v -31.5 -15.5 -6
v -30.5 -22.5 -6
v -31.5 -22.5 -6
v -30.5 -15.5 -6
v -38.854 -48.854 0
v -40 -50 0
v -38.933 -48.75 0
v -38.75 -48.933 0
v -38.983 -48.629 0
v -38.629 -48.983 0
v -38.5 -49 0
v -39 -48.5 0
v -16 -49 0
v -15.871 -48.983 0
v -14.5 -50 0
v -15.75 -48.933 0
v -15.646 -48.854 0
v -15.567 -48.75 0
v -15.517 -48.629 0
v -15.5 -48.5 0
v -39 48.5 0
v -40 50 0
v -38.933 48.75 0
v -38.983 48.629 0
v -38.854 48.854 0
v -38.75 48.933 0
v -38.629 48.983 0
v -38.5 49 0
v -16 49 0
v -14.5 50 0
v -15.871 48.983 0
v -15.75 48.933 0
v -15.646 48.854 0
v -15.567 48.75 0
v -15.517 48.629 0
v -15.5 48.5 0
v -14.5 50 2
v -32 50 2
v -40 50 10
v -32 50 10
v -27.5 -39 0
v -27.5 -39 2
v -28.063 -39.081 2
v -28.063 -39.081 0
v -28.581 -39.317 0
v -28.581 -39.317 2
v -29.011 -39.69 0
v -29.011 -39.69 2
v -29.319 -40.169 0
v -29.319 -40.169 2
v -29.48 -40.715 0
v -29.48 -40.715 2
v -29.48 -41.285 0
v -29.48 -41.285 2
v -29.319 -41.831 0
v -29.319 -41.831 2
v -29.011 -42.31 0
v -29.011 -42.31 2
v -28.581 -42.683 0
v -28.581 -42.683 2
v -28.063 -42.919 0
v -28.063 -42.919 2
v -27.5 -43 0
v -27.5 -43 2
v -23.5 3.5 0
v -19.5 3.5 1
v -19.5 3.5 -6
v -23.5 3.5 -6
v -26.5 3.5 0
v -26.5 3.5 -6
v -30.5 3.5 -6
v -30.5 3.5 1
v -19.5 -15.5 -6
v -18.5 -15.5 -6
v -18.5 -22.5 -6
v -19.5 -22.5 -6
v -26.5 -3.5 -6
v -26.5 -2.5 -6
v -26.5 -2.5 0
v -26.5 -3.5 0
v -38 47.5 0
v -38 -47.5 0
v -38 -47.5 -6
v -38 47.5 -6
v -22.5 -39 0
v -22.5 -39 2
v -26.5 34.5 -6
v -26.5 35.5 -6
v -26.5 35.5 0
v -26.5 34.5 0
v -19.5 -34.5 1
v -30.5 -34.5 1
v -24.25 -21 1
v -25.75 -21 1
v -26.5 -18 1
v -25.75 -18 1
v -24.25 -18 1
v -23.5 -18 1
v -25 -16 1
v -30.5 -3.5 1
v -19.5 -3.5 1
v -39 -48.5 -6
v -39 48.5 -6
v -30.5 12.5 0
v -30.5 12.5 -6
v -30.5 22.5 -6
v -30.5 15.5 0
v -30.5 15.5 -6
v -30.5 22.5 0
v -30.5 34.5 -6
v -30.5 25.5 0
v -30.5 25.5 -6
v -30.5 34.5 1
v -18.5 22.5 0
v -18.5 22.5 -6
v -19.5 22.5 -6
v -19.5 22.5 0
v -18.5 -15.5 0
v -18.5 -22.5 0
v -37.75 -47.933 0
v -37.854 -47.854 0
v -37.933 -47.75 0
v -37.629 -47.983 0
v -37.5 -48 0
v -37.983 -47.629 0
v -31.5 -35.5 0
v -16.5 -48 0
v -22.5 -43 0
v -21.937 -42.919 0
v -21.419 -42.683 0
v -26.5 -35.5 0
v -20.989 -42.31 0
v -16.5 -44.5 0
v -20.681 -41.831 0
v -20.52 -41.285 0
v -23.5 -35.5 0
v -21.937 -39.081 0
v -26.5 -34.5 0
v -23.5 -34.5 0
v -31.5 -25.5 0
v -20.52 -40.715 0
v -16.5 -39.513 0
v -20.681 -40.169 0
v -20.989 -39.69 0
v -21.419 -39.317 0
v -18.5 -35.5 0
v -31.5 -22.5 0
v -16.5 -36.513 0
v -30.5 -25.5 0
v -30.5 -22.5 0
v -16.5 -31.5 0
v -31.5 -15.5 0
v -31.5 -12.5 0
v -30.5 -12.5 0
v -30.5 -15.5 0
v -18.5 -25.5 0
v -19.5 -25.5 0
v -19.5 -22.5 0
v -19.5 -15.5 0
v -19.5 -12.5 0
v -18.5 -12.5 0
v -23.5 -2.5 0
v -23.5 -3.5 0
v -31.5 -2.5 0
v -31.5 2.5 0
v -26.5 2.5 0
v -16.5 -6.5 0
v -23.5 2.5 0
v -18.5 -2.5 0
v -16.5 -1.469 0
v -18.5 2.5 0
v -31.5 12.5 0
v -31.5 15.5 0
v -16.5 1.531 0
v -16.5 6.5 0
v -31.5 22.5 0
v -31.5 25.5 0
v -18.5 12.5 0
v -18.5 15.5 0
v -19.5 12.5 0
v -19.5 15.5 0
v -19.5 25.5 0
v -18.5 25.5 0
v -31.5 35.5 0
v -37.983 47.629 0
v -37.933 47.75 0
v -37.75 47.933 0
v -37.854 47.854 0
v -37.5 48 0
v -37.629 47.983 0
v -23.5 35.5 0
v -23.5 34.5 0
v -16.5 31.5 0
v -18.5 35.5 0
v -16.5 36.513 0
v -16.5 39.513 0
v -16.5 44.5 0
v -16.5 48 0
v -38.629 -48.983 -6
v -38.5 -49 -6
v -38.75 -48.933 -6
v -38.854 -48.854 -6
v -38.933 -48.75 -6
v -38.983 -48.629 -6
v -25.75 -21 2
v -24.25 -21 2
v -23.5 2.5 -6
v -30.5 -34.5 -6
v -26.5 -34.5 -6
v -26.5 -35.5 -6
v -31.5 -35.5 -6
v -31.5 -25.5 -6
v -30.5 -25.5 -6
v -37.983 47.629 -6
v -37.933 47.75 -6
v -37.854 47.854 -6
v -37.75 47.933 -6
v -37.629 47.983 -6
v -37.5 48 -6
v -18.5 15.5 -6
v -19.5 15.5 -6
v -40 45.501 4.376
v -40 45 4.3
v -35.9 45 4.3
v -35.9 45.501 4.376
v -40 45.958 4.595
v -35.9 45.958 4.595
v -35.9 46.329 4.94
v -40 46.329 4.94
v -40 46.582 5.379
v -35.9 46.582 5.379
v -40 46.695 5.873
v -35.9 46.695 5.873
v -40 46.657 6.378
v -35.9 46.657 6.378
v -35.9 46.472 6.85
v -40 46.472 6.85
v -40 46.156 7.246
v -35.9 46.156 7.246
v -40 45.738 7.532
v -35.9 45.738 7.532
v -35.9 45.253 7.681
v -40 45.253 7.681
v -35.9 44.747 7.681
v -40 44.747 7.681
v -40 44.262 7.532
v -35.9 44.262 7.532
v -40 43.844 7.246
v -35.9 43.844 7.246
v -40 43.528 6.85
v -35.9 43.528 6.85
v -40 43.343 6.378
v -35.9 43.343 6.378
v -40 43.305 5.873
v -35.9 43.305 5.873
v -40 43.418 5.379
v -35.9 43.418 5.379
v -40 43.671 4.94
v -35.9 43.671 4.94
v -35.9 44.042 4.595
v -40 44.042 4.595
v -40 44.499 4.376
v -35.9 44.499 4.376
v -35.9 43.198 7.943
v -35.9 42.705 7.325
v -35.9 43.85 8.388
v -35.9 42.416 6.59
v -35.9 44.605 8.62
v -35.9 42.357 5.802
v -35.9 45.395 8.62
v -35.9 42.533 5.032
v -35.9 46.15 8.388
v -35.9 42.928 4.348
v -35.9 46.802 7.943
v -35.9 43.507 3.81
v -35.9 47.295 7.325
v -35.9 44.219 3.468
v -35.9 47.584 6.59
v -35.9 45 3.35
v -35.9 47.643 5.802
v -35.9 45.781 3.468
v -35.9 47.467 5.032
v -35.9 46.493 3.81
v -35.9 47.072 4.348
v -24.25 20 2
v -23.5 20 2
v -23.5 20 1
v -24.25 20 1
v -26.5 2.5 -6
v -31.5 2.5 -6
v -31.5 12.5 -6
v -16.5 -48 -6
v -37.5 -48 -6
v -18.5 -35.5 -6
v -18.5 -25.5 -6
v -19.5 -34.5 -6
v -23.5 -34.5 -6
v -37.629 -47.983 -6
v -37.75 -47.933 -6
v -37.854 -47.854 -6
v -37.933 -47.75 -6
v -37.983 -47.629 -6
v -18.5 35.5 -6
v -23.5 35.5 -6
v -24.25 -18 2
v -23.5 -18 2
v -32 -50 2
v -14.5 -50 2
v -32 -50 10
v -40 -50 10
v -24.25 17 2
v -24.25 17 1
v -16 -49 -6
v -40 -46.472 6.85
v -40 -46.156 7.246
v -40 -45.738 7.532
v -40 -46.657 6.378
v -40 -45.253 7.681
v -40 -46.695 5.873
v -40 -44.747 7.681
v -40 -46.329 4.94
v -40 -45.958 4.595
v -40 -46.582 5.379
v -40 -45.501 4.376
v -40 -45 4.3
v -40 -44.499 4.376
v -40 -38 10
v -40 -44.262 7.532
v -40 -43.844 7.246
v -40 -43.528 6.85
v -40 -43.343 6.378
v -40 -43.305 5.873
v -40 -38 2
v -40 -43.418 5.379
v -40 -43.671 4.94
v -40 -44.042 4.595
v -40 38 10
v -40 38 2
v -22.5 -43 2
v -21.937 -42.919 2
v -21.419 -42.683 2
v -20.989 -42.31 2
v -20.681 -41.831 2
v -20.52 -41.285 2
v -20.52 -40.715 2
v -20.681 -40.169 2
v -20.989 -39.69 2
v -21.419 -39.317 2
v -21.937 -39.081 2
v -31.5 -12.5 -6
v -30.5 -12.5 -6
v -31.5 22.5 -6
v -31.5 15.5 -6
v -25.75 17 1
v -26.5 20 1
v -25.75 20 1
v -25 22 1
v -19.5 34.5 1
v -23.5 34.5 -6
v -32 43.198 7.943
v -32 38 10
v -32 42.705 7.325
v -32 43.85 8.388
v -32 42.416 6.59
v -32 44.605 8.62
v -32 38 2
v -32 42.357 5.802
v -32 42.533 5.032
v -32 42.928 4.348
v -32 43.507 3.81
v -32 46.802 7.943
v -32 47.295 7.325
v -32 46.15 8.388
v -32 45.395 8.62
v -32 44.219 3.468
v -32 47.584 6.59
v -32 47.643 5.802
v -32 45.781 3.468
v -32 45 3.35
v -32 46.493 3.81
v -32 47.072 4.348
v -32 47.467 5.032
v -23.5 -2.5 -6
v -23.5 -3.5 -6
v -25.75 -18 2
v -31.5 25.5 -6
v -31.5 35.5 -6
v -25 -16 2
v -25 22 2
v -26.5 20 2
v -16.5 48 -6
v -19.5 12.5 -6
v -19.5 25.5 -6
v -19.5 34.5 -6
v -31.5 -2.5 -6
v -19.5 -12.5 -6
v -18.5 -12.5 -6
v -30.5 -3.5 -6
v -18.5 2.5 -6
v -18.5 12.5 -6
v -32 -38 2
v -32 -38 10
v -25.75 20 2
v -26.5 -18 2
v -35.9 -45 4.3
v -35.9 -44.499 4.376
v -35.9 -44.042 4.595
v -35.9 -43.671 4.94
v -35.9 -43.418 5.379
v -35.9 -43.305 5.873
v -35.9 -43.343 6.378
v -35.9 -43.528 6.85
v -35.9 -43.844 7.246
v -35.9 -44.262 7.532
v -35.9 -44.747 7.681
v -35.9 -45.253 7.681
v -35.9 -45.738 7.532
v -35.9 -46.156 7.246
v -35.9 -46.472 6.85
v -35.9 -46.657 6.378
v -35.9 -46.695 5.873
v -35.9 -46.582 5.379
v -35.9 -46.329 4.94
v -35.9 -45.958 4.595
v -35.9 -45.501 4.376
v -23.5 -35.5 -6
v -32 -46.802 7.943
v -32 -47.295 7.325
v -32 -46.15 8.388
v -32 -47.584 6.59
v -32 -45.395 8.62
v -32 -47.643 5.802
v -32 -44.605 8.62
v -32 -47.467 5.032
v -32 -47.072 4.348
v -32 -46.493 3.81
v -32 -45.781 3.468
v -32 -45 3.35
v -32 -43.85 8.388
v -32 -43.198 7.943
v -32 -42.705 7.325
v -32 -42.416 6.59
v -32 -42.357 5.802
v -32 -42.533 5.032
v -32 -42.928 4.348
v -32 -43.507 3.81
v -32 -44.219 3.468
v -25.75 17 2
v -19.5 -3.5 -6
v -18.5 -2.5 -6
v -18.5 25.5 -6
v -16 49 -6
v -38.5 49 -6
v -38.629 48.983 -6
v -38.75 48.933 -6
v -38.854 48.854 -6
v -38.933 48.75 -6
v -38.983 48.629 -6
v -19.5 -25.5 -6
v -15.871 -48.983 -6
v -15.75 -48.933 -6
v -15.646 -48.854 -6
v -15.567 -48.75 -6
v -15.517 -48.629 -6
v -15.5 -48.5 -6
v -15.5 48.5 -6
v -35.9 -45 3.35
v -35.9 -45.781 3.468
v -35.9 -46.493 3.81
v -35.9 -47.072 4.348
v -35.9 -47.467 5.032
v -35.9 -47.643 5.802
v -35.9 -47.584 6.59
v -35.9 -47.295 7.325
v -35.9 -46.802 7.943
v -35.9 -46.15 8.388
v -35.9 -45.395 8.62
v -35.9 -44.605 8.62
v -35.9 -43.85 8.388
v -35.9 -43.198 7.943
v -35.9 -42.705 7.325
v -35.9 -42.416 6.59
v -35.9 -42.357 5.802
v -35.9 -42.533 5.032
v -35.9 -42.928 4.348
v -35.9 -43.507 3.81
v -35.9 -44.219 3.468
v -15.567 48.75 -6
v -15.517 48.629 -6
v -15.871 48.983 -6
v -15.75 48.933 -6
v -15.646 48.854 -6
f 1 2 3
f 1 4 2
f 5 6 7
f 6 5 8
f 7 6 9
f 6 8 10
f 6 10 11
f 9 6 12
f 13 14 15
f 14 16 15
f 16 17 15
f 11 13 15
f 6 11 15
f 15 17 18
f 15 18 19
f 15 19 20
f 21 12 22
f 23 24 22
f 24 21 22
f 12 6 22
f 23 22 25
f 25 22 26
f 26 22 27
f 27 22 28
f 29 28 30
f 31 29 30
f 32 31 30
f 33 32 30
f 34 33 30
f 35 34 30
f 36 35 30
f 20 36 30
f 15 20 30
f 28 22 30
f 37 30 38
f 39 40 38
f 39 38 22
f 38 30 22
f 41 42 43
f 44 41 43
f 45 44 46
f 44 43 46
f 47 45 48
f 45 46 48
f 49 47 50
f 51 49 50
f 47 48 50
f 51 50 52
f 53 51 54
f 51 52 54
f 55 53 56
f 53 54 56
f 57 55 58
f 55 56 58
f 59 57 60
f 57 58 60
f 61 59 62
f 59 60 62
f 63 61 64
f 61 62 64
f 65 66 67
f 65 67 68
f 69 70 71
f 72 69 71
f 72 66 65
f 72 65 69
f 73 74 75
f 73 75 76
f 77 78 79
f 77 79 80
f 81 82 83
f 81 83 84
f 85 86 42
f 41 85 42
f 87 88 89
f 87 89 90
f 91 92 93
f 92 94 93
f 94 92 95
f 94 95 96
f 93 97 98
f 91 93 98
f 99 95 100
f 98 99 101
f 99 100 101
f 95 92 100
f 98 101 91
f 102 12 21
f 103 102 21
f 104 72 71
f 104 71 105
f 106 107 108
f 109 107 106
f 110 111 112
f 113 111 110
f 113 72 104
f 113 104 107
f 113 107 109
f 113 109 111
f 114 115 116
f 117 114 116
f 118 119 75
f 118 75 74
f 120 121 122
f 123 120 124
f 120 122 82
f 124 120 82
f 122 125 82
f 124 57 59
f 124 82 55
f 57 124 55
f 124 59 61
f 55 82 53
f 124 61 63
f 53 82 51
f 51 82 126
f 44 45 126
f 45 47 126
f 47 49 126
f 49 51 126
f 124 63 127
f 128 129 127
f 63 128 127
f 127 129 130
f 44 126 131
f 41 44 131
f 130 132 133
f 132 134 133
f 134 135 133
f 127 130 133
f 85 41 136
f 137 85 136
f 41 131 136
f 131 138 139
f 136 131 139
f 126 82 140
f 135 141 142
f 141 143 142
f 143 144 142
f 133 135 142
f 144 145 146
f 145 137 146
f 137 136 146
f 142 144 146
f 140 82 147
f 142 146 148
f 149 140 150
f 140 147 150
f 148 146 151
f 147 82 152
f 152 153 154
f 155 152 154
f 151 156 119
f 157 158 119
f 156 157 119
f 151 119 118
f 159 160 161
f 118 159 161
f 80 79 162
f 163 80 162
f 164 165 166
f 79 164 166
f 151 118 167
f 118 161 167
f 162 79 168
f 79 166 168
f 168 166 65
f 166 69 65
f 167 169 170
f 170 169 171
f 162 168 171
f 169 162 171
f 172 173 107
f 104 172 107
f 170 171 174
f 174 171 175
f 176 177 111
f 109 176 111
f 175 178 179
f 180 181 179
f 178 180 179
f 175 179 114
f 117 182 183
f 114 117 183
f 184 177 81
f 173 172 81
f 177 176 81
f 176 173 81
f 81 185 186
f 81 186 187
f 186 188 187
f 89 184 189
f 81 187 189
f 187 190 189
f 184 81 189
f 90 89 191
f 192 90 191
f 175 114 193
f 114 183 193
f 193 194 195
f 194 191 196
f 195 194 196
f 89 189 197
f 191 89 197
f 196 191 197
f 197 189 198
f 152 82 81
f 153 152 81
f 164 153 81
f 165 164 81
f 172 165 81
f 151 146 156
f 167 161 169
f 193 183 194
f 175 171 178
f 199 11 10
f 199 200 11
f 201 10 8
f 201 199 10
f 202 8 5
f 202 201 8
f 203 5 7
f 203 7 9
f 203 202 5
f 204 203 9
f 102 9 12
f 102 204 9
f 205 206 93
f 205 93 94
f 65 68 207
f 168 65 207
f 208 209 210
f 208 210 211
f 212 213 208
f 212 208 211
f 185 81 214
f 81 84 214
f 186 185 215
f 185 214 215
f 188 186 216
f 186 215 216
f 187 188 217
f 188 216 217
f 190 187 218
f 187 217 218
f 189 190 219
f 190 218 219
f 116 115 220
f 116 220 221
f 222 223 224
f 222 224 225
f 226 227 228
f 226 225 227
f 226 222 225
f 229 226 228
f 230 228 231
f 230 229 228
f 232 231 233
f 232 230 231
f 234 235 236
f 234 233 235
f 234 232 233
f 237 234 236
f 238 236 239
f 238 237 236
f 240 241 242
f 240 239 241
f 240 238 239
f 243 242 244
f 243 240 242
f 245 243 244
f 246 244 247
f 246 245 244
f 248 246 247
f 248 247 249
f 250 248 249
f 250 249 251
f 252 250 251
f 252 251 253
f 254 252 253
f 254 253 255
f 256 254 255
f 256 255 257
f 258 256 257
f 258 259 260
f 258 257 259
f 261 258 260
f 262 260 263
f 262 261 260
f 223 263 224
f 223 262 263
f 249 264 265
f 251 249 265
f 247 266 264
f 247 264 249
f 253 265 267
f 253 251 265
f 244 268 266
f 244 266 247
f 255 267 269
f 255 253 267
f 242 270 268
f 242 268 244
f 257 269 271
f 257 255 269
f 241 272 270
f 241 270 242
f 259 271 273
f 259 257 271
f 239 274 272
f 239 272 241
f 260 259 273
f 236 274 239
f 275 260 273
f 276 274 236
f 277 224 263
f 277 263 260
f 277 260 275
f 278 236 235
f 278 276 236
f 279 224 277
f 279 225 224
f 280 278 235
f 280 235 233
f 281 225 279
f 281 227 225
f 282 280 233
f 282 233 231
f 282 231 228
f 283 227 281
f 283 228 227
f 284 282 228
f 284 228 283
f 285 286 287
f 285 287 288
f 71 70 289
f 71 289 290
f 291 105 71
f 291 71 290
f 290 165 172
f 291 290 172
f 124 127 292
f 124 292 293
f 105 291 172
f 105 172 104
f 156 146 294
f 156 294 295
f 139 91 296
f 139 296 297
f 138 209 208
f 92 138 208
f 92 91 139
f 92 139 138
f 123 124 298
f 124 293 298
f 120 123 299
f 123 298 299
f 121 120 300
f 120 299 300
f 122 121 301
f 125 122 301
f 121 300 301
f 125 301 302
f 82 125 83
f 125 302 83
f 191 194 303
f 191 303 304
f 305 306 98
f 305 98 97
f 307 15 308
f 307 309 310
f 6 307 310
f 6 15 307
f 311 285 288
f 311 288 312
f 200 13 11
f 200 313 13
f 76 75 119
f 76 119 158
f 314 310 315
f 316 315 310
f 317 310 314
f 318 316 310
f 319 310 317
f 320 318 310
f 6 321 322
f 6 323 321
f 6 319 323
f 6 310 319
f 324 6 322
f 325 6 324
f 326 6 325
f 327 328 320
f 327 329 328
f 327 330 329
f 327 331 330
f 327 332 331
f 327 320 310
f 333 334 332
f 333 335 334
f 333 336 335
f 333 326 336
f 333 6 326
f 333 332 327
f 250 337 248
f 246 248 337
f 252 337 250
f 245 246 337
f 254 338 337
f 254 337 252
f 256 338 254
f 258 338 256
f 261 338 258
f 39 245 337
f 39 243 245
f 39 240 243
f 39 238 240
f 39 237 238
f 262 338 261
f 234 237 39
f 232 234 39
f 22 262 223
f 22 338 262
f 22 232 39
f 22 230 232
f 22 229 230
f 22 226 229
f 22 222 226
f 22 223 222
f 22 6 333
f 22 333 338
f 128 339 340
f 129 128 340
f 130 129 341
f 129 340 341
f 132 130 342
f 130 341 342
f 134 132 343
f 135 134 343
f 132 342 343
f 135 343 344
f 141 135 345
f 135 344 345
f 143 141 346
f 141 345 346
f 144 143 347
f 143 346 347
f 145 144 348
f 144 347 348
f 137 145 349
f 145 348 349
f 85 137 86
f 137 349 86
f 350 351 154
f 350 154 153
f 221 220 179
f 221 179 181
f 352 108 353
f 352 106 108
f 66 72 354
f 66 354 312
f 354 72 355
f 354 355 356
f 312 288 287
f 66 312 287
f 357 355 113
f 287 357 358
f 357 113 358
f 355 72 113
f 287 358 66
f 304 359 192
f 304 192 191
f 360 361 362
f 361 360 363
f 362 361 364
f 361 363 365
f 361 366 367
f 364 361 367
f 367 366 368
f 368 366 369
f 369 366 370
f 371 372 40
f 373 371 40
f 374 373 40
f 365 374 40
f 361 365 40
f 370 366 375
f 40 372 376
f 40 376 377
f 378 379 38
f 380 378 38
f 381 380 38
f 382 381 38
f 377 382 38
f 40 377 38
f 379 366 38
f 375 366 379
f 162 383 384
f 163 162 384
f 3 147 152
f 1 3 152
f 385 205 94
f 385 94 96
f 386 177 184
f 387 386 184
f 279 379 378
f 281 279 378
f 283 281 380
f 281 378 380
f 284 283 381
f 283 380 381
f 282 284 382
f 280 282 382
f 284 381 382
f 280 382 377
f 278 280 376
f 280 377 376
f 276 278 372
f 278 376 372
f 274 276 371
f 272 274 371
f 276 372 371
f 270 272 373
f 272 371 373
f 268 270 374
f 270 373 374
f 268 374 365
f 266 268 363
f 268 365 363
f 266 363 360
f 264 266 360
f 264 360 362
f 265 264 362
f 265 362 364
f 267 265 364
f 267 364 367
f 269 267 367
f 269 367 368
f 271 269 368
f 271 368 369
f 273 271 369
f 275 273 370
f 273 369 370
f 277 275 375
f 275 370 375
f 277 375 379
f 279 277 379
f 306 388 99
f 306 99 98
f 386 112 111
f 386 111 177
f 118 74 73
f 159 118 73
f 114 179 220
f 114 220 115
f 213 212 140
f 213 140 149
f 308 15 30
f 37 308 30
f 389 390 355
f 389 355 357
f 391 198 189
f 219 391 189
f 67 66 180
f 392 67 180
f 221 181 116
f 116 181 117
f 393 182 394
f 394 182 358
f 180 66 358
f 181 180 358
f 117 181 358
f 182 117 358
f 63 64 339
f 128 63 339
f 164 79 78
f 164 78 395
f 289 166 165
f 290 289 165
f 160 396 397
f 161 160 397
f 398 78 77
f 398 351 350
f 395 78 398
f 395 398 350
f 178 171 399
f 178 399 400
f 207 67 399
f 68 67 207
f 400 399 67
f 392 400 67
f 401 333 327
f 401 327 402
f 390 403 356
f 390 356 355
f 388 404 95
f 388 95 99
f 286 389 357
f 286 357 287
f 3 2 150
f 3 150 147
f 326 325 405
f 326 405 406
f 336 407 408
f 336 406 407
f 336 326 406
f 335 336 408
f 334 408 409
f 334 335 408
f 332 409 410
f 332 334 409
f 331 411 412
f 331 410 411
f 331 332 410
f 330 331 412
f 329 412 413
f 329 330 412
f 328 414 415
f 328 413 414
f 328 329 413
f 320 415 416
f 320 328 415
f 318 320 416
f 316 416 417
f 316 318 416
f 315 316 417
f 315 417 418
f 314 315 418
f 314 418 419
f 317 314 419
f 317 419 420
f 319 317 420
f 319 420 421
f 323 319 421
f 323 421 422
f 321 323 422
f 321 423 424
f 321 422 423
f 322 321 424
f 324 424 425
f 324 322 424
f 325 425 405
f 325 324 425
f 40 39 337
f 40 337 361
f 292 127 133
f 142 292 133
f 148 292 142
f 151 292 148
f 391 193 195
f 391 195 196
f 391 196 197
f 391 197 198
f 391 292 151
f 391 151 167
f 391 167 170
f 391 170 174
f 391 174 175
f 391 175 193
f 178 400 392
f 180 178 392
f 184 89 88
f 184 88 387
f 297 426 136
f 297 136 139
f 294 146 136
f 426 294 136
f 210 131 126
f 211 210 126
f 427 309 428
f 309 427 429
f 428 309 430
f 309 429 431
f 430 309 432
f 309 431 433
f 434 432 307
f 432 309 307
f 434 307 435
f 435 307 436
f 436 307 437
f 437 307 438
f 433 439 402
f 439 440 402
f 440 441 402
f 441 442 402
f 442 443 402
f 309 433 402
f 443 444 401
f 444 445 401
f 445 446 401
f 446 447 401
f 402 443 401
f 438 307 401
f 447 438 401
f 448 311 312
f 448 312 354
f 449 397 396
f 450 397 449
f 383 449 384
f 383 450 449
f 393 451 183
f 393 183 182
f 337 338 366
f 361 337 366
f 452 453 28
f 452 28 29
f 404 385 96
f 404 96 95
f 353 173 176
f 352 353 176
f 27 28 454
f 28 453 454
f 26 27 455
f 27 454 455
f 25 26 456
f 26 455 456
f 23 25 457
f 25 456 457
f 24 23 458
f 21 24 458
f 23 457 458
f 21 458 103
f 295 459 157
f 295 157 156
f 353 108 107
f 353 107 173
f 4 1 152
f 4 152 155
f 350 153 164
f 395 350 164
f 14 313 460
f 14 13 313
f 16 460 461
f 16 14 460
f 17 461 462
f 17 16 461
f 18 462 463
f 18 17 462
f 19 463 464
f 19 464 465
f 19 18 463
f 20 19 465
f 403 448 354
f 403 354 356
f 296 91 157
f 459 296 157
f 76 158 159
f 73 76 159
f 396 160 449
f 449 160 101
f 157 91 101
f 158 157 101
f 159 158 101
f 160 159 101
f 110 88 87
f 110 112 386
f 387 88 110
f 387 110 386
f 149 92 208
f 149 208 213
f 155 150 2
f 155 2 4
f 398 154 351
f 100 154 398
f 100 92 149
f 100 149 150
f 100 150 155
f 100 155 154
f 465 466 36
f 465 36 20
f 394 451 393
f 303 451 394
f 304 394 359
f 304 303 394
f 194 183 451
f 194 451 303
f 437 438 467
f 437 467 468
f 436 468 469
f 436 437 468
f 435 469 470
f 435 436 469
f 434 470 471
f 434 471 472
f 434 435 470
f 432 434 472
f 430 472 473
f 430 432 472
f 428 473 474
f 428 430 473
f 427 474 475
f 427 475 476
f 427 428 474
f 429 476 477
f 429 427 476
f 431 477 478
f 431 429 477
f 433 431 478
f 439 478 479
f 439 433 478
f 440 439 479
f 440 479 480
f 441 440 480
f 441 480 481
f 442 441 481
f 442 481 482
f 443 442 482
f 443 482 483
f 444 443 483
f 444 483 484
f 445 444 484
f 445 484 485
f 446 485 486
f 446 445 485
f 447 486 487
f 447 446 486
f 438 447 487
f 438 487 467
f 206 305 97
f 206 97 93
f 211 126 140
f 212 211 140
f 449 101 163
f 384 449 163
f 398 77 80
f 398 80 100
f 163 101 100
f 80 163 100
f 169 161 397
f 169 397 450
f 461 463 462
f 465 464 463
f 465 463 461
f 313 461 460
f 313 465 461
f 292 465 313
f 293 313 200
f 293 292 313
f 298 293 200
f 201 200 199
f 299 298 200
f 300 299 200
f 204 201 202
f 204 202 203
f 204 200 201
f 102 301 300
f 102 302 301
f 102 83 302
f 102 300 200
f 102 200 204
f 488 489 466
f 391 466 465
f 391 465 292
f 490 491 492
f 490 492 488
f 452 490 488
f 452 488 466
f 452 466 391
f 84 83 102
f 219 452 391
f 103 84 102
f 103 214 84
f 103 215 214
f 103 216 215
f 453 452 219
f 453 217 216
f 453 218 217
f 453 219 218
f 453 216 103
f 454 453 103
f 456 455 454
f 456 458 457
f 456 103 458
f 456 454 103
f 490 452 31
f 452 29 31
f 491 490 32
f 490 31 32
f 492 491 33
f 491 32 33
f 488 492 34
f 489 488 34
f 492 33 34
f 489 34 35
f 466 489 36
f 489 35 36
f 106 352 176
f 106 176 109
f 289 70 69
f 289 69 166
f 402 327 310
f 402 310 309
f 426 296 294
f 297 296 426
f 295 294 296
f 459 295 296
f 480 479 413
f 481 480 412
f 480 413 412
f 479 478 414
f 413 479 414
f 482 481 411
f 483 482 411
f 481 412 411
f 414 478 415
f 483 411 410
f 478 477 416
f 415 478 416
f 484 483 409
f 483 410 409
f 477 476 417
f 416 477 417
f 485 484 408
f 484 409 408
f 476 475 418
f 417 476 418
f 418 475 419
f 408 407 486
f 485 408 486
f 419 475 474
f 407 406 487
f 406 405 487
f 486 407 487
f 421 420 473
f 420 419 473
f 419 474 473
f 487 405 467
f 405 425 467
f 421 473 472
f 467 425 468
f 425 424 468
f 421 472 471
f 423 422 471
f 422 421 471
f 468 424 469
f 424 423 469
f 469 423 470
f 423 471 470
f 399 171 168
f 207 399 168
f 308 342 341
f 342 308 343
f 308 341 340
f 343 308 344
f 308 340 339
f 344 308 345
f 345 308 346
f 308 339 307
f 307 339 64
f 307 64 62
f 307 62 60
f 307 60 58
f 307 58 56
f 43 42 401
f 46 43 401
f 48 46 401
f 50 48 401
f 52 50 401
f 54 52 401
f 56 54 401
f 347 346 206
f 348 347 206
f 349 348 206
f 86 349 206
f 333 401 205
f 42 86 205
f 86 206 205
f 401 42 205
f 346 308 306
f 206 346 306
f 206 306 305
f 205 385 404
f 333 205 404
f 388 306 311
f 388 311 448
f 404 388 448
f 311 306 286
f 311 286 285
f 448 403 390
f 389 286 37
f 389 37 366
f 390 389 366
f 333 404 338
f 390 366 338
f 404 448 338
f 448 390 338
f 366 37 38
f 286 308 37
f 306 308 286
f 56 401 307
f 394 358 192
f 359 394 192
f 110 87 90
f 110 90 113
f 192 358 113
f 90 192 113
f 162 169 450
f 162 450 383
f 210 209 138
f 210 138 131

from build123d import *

# Parameters (mm, degrees)
SKETCH1_W               = 80
SKETCH1_H               = 100
SKETCH1_W_2             = 31
SKETCH1_H_2             = 11
SKETCH1_W_3             = 11
SKETCH1_H_3             = 31
BOSS_EXTRUDE1_DEPTH     = 1
SKETCH2_W               = 80
SKETCH2_H               = 100
BACK_DEPTH              = 1
SKETCH3_W               = 13
SKETCH3_H               = 33
SKETCH3_W_2             = 11
SKETCH3_H_2             = 31
SKETCH3_W_3             = 33
SKETCH3_H_3             = 13
SKETCH3_W_4             = 31
SKETCH3_H_4             = 11
SEG_MASKS_DEPTH         = 6
SKETCH5_W               = 78
SKETCH5_H               = 98
SKETCH5_W_2             = 76
SKETCH5_H_2             = 96
OUTER_RIM_DEPTH         = 6
DIRECTION_DEPTH         = 65.412731661
DIRECTION_DEPTH_BACK    = 65.412731661
SKETCH7_W               = 17
SKETCH7_H               = 7
SKETCH7_W_2             = 7
SKETCH7_H_2             = 11.013011135
SKETCH7_H_3             = 10.96937703
SKETCH7_H_4             = 11.03062297
WIRE_CHASES_DEPTH       = 6
HANGING_HOLE_DEPTH      = 65.311740763
HANGING_HOLE_DEPTH_BACK = 65.311740763
FILLET1_R               = 0.5
SKETCH9_W               = 8
SKETCH9_H               = 12
BOSS_EXTRUDE2_DEPTH     = 8
CUT_EXTRUDE1_DEPTH      = 95.868329805
CUT_EXTRUDE1_DEPTH_BACK = 95.868329805
SKETCH10_R              = 1.7
SKETCH11_R              = 2.65
CUT_EXTRUDE2_DEPTH      = 3.9
MIRROR4_COPY_1_SKETCH_R = 2.65
MIRROR4_COPY_1_DEPTH    = 3.9
MIRROR4_COPY_2_SKETCH_R = 2.65
MIRROR4_COPY_2_DEPTH    = 3.9
SKETCH12_W              = 1.5
SKETCH12_H              = 7
BOSS_EXTRUDE3_DEPTH     = 6
SKETCH13_W              = 15.5
SKETCH13_H              = 1.5
BOSS_EXTRUDE4_DEPTH     = 1.5
FILLET2_R               = 1.5
CUT_EXTRUDE3_DEPTH      = 65.807406984
CUT_EXTRUDE3_DEPTH_BACK = 65.807406984
CUT_EXTRUDE4_DEPTH      = 65.807406984
CUT_EXTRUDE4_DEPTH_BACK = 65.807406984
SKETCH15_W              = 64.445806935
SKETCH15_H              = 114.080539226
SKETCH16_W              = 2
SKETCH16_H              = 100
BOSS_EXTRUDE5_DEPTH     = 8
CUT_EXTRUDE5_DEPTH      = 65.807406984
CUT_EXTRUDE5_DEPTH_BACK = 65.807406984
CUT_EXTRUDE6_DEPTH      = 6
FILLET3_R               = 0.5


with BuildPart() as part:
    # Sketch1 → Boss-Extrude1 (new body)
    with BuildSketch(Plane.XY):
        Rectangle(SKETCH1_W, SKETCH1_H)
        with Locations((0, 38)):
            Rectangle(SKETCH1_W_2, SKETCH1_H_2, mode=Mode.SUBTRACT)
        Rectangle(SKETCH1_W_2, SKETCH1_H_2, mode=Mode.SUBTRACT)
        with Locations((0, -38)):
            Rectangle(SKETCH1_W_2, SKETCH1_H_2, mode=Mode.SUBTRACT)
        with Locations((25, 19)):
            Rectangle(SKETCH1_W_3, SKETCH1_H_3, mode=Mode.SUBTRACT)
        with Locations((-25, 19)):
            Rectangle(SKETCH1_W_3, SKETCH1_H_3, mode=Mode.SUBTRACT)
        with Locations((-25, -19)):
            Rectangle(SKETCH1_W_3, SKETCH1_H_3, mode=Mode.SUBTRACT)
        with Locations((25, -19)):
            Rectangle(SKETCH1_W_3, SKETCH1_H_3, mode=Mode.SUBTRACT)
    extrude(amount=BOSS_EXTRUDE1_DEPTH)

    # Sketch2 → back (add)
    with BuildSketch(Plane.XY.offset(1)):
        Rectangle(SKETCH2_W, SKETCH2_H)
    extrude(amount=BACK_DEPTH)

    # Sketch3 → seg masks (add)
    # profile 1 of 7: a face of its own
    with BuildSketch(Plane(origin=(0, 0, 0), x_dir=(-1, 0, 0), z_dir=(0, 0, -1))):
        with Locations((-25, 19)):
            Rectangle(SKETCH3_W, SKETCH3_H)
        with Locations((-25, 19)):
            Rectangle(SKETCH3_W_2, SKETCH3_H_2, mode=Mode.SUBTRACT)
    # profile 2 of 7: a face of its own
    with BuildSketch(Plane(origin=(0, 0, 0), x_dir=(-1, 0, 0), z_dir=(0, 0, -1))):
        with Locations((0, 38)):
            Rectangle(SKETCH3_W_3, SKETCH3_H_3)
        with Locations((0, 38)):
            Rectangle(SKETCH3_W_4, SKETCH3_H_4, mode=Mode.SUBTRACT)
    # profile 3 of 7: a face of its own
    with BuildSketch(Plane(origin=(0, 0, 0), x_dir=(-1, 0, 0), z_dir=(0, 0, -1))):
        with Locations((25, 19)):
            Rectangle(SKETCH3_W, SKETCH3_H)
        with Locations((25, 19)):
            Rectangle(SKETCH3_W_2, SKETCH3_H_2, mode=Mode.SUBTRACT)
    # profile 4 of 7: a face of its own
    with BuildSketch(Plane(origin=(0, 0, 0), x_dir=(-1, 0, 0), z_dir=(0, 0, -1))):
        Rectangle(SKETCH3_W_3, SKETCH3_H_3)
        Rectangle(SKETCH3_W_4, SKETCH3_H_4, mode=Mode.SUBTRACT)
    # profile 5 of 7: a face of its own
    with BuildSketch(Plane(origin=(0, 0, 0), x_dir=(-1, 0, 0), z_dir=(0, 0, -1))):
        with Locations((-25, -19)):
            Rectangle(SKETCH3_W, SKETCH3_H)
        with Locations((-25, -19)):
            Rectangle(SKETCH3_W_2, SKETCH3_H_2, mode=Mode.SUBTRACT)
    # profile 6 of 7: a face of its own
    with BuildSketch(Plane(origin=(0, 0, 0), x_dir=(-1, 0, 0), z_dir=(0, 0, -1))):
        with Locations((0, -38)):
            Rectangle(SKETCH3_W_3, SKETCH3_H_3)
        with Locations((0, -38)):
            Rectangle(SKETCH3_W_4, SKETCH3_H_4, mode=Mode.SUBTRACT)
    # profile 7 of 7: a face of its own
    with BuildSketch(Plane(origin=(0, 0, 0), x_dir=(-1, 0, 0), z_dir=(0, 0, -1))):
        with Locations((25, -19)):
            Rectangle(SKETCH3_W, SKETCH3_H)
        with Locations((25, -19)):
            Rectangle(SKETCH3_W_2, SKETCH3_H_2, mode=Mode.SUBTRACT)
    extrude(amount=SEG_MASKS_DEPTH)

    # Sketch5 → outer rim (add)
    with BuildSketch(Plane(origin=(0, 0, 0), x_dir=(-1, 0, 0), z_dir=(0, 0, -1))):
        Rectangle(SKETCH5_W, SKETCH5_H)
        Rectangle(SKETCH5_W_2, SKETCH5_H_2, mode=Mode.SUBTRACT)
    extrude(amount=OUTER_RIM_DEPTH)

    # Sketch6 → direction (cut, two sides: drawn at the far end of the back side and taken through both)
    with BuildSketch(Plane(origin=(0, 0, 1), x_dir=(-1, 0, 0), z_dir=(0, 0, -1)).offset(-DIRECTION_DEPTH_BACK)):
        Polygon((25, 22), (23.5, 20), (24.25, 20), (24.25, 17), (25.75, 17), (25.75, 20), (26.5, 20), align=None)
        Polygon((-3, 38), (-1, 36.5), (-1, 37.25), (2, 37.25), (2, 38.75), (-1, 38.75), (-1, 39.5), align=None)
        Polygon((-24.25, 21), (-25.75, 21), (-25.75, 18.5), (-26.5, 18.5), (-25, 16), (-23.5, 18.5), (-24.25, 18.5), align=None)
        Polygon((-24.25, -17), (-25.75, -17), (-25.75, -20), (-26.5, -20), (-25, -22), (-23.5, -20), (-24.25, -20), align=None)
        Polygon((-2, -38.75), (-2, -37.25), (1, -37.25), (1, -36.5), (3, -38), (1, -39.5), (1, -38.75), align=None)
        Polygon((25, -16), (23.5, -18), (24.25, -18), (24.25, -21), (25.75, -21), (25.75, -18), (26.5, -18), align=None)
        Polygon((-0.5, 1.5), (-3, 0), (-0.5, -1.5), (-0.5, -0.75), (2, -0.75), (2, 0), (2, 0.75), (-0.5, 0.75), align=None)
    extrude(amount=DIRECTION_DEPTH + DIRECTION_DEPTH_BACK, mode=Mode.SUBTRACT)

    # Sketch7 → wire chases (cut)
    with BuildSketch(Plane(origin=(0, 0, -6), x_dir=(-1, 0, 0), z_dir=(0, 0, -1))):
        Polygon((-6.5, 46), (-3.5, 46), (-3.5, 39.513011135), (3.5, 39.513011135), (3.5, 46), (6.5, 46), (6.5, 39.513011135), (18, 39.513011135), (18, 36.513011135), (6.5, 36.513011135), (6.5, 25.5), (23.5, 25.5), (23.5, 37.5), (26.5, 37.5), (26.5, 25.5), (33, 25.5), (33, 22.5), (26.5, 22.5), (26.5, 15.5), (33, 15.5), (33, 12.5), (26.5, 12.5), (26.5, -12.5), (33, -12.5), (33, -15.5), (26.5, -15.5), (26.5, -22.5), (33, -22.5), (33, -25.5), (26.5, -25.5), (26.5, -37.5), (23.5, -37.5), (23.5, -25.5), (6.5, -25.5), (6.5, -36.513011135), (18, -36.513011135), (18, -39.513011135), (6.5, -39.513011135), (6.5, -46), (3.5, -46), (3.5, -39.513011135), (-3.5, -39.513011135), (-3.5, -46), (-6.5, -46), (-6.5, -39.513011135), (-18, -39.513011135), (-18, -36.513011135), (-6.5, -36.513011135), (-6.5, -25.5), (-23.5, -25.5), (-23.5, -37.5), (-26.5, -37.5), (-26.5, -25.5), (-33, -25.5), (-33, -22.5), (-26.5, -22.5), (-26.5, -15.5), (-33, -15.5), (-33, -12.5), (-26.5, -12.5), (-26.5, 12.5), (-33, 12.5), (-33, 15.5), (-26.5, 15.5), (-26.5, 22.5), (-33, 22.5), (-33, 25.5), (-26.5, 25.5), (-26.5, 37.5), (-23.5, 37.5), (-23.5, 25.5), (-6.5, 25.5), (-6.5, 36.513011135), (-18, 36.513011135), (-18, 39.513011135), (-6.5, 39.513011135), align=None)
        with Locations((-15, 19)):
            Rectangle(SKETCH7_W, SKETCH7_H, mode=Mode.SUBTRACT)
        with Locations((0, 31.006505567)):
            Rectangle(SKETCH7_W_2, SKETCH7_H_2, mode=Mode.SUBTRACT)
        with Locations((0, 19)):
            Rectangle(SKETCH7_W_2, SKETCH7_H, mode=Mode.SUBTRACT)
        with Locations((15, 19)):
            Rectangle(SKETCH7_W, SKETCH7_H, mode=Mode.SUBTRACT)
        Polygon((-6.5, 12.5), (-6.5, 1.53062297), (-18, 1.53062297), (-18, -1.46937703), (-6.5, -1.46937703), (-6.5, -12.5), (-23.5, -12.5), (-23.5, 12.5), align=None, mode=Mode.SUBTRACT)
        with Locations((0, 7.015311485)):
            Rectangle(SKETCH7_W_2, SKETCH7_H_3, mode=Mode.SUBTRACT)
        Polygon((6.5, 12.5), (23.5, 12.5), (23.5, -12.5), (6.5, -12.5), (6.5, -1.46937703), (18, -1.46937703), (18, 1.53062297), (6.5, 1.53062297), align=None, mode=Mode.SUBTRACT)
        with Locations((-15, -19)):
            Rectangle(SKETCH7_W, SKETCH7_H, mode=Mode.SUBTRACT)
        with Locations((0, -6.984688515)):
            Rectangle(SKETCH7_W_2, SKETCH7_H_4, mode=Mode.SUBTRACT)
        with Locations((0, -19)):
            Rectangle(SKETCH7_W_2, SKETCH7_H, mode=Mode.SUBTRACT)
        with Locations((15, -19)):
            Rectangle(SKETCH7_W, SKETCH7_H, mode=Mode.SUBTRACT)
        with Locations((0, -31.006505567)):
            Rectangle(SKETCH7_W_2, SKETCH7_H_2, mode=Mode.SUBTRACT)
    extrude(amount=-WIRE_CHASES_DEPTH, mode=Mode.SUBTRACT)

    # Sketch8 → hanging hole (cut, two sides: drawn at the far end of the back side and taken through both)
    with BuildSketch(Plane(origin=(0, 0, 0), x_dir=(-1, 0, 0), z_dir=(0, 0, -1)).offset(-HANGING_HOLE_DEPTH_BACK)):
        with BuildLine():
            Line((2, 27), (2, 22.464101615))
            ThreePointArc((2, 22.464101615), (0, 15), (-2, 22.464101615))
            Line((-2, 22.464101615), (-2, 27))
            ThreePointArc((-2, 27), (0, 29), (2, 27))
        make_face()
    extrude(amount=HANGING_HOLE_DEPTH + HANGING_HOLE_DEPTH_BACK, mode=Mode.SUBTRACT)

    # Fillet1
    fillet1_edges = [part.edges().sort_by_distance(p)[0] for p in [
        (-39, -49, -3),
        (-39, 49, -3),
        (39, 49, -3),
        (39, -49, -3),
        (38, -48, -3),
        (-38, -48, -3),
        (-38, 48, -3),
        (38, 48, -3),
    ]]
    fillet(fillet1_edges, radius=FILLET1_R)

    # Sketch9 → Boss-Extrude2 (add)
    with BuildSketch(Plane.XY.offset(2)):
        with Locations((-36, 44)):
            Rectangle(SKETCH9_W, SKETCH9_H)
        with Locations((-36, -44)):
            Rectangle(SKETCH9_W, SKETCH9_H)
        with Locations((36, -44)):
            Rectangle(SKETCH9_W, SKETCH9_H)
        with Locations((36, 44)):
            Rectangle(SKETCH9_W, SKETCH9_H)
    extrude(amount=BOSS_EXTRUDE2_DEPTH)

    # Sketch10 → Cut-Extrude1 (cut, two sides: drawn at the far end of the back side and taken through both)
    with BuildSketch(Plane(origin=(40, 0, 0), x_dir=(0, 0, -1), z_dir=(1, 0, 0)).offset(-CUT_EXTRUDE1_DEPTH_BACK)):
        with Locations((-6, 45)):
            Circle(SKETCH10_R)
        with Locations((-6, -45)):
            Circle(SKETCH10_R)
    extrude(amount=CUT_EXTRUDE1_DEPTH + CUT_EXTRUDE1_DEPTH_BACK, mode=Mode.SUBTRACT)

    # Sketch11 → Cut-Extrude2 (cut)
    with BuildSketch(Plane(origin=(-32, 0, 0), x_dir=(0, 0, -1), z_dir=(1, 0, 0))):
        with Locations((-6, 45)):
            Circle(SKETCH11_R)
    cut_extrude2 = extrude(amount=-CUT_EXTRUDE2_DEPTH, mode=Mode.SUBTRACT)

    # Mirror1: Cut-Extrude2 across plane
    add(cut_extrude2.mirror(Plane.ZX), mode=Mode.SUBTRACT)

    # Mirror2: Cut-Extrude2 across plane
    add(cut_extrude2.mirror(Plane(origin=(0, 0, 0), x_dir=(0, 0, 1), z_dir=(1, 0, 0))), mode=Mode.SUBTRACT)

    # Mirror4 copy 1 sketch → Mirror4 copy 1 (cut)
    with BuildSketch(Plane(origin=(32, 0, 0), x_dir=(0, 0, -1), z_dir=(-1, 0, 0))):
        with Locations((-6, 45)):
            Circle(MIRROR4_COPY_1_SKETCH_R)
    extrude(amount=-MIRROR4_COPY_1_DEPTH, mode=Mode.SUBTRACT)

    # Mirror4 copy 2 sketch → Mirror4 copy 2 (cut)
    with BuildSketch(Plane(origin=(32, 0, 0), x_dir=(0, 0, -1), z_dir=(-1, 0, 0))):
        with Locations((-6, -45)):
            Circle(MIRROR4_COPY_2_SKETCH_R)
    extrude(amount=-MIRROR4_COPY_2_DEPTH, mode=Mode.SUBTRACT)

    # Sketch12 → Boss-Extrude3 (add)
    with BuildSketch(Plane.XY.offset(2)):
        with Locations((7.25, -18.5)):
            Rectangle(SKETCH12_W, SKETCH12_H)
        with Locations((21.25, -18.5)):
            Rectangle(SKETCH12_W, SKETCH12_H)
    extrude(amount=BOSS_EXTRUDE3_DEPTH)

    # Sketch13 → Boss-Extrude4 (add)
    with BuildSketch(Plane.XY.offset(2)):
        with Locations((14.25, -14.25)):
            Rectangle(SKETCH13_W, SKETCH13_H)
    extrude(amount=BOSS_EXTRUDE4_DEPTH)

    # Fillet2
    fillet2_edges = [part.edges().sort_by_distance(p)[0] for p in [
        (22, -17.75, 2),
        (14.25, -13.5, 2),
        (6.5, -17.75, 2),
    ]]
    fillet(fillet2_edges, radius=FILLET2_R - 0.0001)  # a hair under: the kernel refuses the full size

    # Sketch14 → Cut-Extrude3 (cut, two sides: drawn at the far end of the back side and taken through both)
    with BuildSketch(Plane(origin=(0, 0, 0), x_dir=(-1, 0, 0), z_dir=(0, 0, -1)).offset(-CUT_EXTRUDE3_DEPTH_BACK)):
        with BuildLine():
            Line((-2.5, -18), (2.5, -18))
            ThreePointArc((2.5, -18), (4.5, -20), (2.5, -22))
            Line((2.5, -22), (-2.5, -22))
            ThreePointArc((-2.5, -22), (-4.5, -20), (-2.5, -18))
        make_face()
    extrude(amount=CUT_EXTRUDE3_DEPTH + CUT_EXTRUDE3_DEPTH_BACK, mode=Mode.SUBTRACT)

    # Sketch15 → Cut-Extrude4 (cut, two sides: drawn at the far end of the back side and taken through both)
    with BuildSketch(Plane(origin=(0, 0, 0), x_dir=(-1, 0, 0), z_dir=(0, 0, -1)).offset(-CUT_EXTRUDE4_DEPTH_BACK)):
        with Locations((-15.722903468, -0.440805793)):
            Rectangle(SKETCH15_W, SKETCH15_H)
    extrude(amount=CUT_EXTRUDE4_DEPTH + CUT_EXTRUDE4_DEPTH_BACK, mode=Mode.SUBTRACT)

    # Sketch16 → Boss-Extrude5 (add)
    with BuildSketch(Plane(origin=(0, 0, -6), x_dir=(-1, 0, 0), z_dir=(0, 0, -1))):
        with Locations((15.5, 0)):
            Rectangle(SKETCH16_W, SKETCH16_H)
    extrude(amount=-BOSS_EXTRUDE5_DEPTH)

    # Sketch17 → Cut-Extrude5 (cut, two sides: drawn at the far end of the back side and taken through both)
    with BuildSketch(Plane(origin=(0, 0, 0), x_dir=(-1, 0, 0), z_dir=(0, 0, -1)).offset(-CUT_EXTRUDE5_DEPTH_BACK)):
        with BuildLine():
            Line((22.5, -39), (27.5, -39))
            ThreePointArc((27.5, -39), (29.5, -41), (27.5, -43))
            Line((27.5, -43), (22.5, -43))
            ThreePointArc((22.5, -43), (20.5, -41), (22.5, -39))
        make_face()
    extrude(amount=CUT_EXTRUDE5_DEPTH + CUT_EXTRUDE5_DEPTH_BACK, mode=Mode.SUBTRACT)

    # Sketch18 → Cut-Extrude6 (cut)
    with BuildSketch(Plane(origin=(0, 0, -6), x_dir=(-1, 0, 0), z_dir=(0, 0, -1))):
        Polygon((14.5, 50), (15.5, 50), (16.5, 50), (16.5, 49), (15.5, 49), (15.5, -49), (16.5, -49), (16.5, -50), (15.5, -50), (14.5, -50), align=None)
    extrude(amount=-CUT_EXTRUDE6_DEPTH, mode=Mode.SUBTRACT)

    # Fillet3
    fillet3_edges = [part.edges().sort_by_distance(p)[0] for p in [
        (-15.5, 49, -3),
        (-15.5, -49, -3),
    ]]
    fillet(fillet3_edges, radius=FILLET3_R)


solid = part.part
